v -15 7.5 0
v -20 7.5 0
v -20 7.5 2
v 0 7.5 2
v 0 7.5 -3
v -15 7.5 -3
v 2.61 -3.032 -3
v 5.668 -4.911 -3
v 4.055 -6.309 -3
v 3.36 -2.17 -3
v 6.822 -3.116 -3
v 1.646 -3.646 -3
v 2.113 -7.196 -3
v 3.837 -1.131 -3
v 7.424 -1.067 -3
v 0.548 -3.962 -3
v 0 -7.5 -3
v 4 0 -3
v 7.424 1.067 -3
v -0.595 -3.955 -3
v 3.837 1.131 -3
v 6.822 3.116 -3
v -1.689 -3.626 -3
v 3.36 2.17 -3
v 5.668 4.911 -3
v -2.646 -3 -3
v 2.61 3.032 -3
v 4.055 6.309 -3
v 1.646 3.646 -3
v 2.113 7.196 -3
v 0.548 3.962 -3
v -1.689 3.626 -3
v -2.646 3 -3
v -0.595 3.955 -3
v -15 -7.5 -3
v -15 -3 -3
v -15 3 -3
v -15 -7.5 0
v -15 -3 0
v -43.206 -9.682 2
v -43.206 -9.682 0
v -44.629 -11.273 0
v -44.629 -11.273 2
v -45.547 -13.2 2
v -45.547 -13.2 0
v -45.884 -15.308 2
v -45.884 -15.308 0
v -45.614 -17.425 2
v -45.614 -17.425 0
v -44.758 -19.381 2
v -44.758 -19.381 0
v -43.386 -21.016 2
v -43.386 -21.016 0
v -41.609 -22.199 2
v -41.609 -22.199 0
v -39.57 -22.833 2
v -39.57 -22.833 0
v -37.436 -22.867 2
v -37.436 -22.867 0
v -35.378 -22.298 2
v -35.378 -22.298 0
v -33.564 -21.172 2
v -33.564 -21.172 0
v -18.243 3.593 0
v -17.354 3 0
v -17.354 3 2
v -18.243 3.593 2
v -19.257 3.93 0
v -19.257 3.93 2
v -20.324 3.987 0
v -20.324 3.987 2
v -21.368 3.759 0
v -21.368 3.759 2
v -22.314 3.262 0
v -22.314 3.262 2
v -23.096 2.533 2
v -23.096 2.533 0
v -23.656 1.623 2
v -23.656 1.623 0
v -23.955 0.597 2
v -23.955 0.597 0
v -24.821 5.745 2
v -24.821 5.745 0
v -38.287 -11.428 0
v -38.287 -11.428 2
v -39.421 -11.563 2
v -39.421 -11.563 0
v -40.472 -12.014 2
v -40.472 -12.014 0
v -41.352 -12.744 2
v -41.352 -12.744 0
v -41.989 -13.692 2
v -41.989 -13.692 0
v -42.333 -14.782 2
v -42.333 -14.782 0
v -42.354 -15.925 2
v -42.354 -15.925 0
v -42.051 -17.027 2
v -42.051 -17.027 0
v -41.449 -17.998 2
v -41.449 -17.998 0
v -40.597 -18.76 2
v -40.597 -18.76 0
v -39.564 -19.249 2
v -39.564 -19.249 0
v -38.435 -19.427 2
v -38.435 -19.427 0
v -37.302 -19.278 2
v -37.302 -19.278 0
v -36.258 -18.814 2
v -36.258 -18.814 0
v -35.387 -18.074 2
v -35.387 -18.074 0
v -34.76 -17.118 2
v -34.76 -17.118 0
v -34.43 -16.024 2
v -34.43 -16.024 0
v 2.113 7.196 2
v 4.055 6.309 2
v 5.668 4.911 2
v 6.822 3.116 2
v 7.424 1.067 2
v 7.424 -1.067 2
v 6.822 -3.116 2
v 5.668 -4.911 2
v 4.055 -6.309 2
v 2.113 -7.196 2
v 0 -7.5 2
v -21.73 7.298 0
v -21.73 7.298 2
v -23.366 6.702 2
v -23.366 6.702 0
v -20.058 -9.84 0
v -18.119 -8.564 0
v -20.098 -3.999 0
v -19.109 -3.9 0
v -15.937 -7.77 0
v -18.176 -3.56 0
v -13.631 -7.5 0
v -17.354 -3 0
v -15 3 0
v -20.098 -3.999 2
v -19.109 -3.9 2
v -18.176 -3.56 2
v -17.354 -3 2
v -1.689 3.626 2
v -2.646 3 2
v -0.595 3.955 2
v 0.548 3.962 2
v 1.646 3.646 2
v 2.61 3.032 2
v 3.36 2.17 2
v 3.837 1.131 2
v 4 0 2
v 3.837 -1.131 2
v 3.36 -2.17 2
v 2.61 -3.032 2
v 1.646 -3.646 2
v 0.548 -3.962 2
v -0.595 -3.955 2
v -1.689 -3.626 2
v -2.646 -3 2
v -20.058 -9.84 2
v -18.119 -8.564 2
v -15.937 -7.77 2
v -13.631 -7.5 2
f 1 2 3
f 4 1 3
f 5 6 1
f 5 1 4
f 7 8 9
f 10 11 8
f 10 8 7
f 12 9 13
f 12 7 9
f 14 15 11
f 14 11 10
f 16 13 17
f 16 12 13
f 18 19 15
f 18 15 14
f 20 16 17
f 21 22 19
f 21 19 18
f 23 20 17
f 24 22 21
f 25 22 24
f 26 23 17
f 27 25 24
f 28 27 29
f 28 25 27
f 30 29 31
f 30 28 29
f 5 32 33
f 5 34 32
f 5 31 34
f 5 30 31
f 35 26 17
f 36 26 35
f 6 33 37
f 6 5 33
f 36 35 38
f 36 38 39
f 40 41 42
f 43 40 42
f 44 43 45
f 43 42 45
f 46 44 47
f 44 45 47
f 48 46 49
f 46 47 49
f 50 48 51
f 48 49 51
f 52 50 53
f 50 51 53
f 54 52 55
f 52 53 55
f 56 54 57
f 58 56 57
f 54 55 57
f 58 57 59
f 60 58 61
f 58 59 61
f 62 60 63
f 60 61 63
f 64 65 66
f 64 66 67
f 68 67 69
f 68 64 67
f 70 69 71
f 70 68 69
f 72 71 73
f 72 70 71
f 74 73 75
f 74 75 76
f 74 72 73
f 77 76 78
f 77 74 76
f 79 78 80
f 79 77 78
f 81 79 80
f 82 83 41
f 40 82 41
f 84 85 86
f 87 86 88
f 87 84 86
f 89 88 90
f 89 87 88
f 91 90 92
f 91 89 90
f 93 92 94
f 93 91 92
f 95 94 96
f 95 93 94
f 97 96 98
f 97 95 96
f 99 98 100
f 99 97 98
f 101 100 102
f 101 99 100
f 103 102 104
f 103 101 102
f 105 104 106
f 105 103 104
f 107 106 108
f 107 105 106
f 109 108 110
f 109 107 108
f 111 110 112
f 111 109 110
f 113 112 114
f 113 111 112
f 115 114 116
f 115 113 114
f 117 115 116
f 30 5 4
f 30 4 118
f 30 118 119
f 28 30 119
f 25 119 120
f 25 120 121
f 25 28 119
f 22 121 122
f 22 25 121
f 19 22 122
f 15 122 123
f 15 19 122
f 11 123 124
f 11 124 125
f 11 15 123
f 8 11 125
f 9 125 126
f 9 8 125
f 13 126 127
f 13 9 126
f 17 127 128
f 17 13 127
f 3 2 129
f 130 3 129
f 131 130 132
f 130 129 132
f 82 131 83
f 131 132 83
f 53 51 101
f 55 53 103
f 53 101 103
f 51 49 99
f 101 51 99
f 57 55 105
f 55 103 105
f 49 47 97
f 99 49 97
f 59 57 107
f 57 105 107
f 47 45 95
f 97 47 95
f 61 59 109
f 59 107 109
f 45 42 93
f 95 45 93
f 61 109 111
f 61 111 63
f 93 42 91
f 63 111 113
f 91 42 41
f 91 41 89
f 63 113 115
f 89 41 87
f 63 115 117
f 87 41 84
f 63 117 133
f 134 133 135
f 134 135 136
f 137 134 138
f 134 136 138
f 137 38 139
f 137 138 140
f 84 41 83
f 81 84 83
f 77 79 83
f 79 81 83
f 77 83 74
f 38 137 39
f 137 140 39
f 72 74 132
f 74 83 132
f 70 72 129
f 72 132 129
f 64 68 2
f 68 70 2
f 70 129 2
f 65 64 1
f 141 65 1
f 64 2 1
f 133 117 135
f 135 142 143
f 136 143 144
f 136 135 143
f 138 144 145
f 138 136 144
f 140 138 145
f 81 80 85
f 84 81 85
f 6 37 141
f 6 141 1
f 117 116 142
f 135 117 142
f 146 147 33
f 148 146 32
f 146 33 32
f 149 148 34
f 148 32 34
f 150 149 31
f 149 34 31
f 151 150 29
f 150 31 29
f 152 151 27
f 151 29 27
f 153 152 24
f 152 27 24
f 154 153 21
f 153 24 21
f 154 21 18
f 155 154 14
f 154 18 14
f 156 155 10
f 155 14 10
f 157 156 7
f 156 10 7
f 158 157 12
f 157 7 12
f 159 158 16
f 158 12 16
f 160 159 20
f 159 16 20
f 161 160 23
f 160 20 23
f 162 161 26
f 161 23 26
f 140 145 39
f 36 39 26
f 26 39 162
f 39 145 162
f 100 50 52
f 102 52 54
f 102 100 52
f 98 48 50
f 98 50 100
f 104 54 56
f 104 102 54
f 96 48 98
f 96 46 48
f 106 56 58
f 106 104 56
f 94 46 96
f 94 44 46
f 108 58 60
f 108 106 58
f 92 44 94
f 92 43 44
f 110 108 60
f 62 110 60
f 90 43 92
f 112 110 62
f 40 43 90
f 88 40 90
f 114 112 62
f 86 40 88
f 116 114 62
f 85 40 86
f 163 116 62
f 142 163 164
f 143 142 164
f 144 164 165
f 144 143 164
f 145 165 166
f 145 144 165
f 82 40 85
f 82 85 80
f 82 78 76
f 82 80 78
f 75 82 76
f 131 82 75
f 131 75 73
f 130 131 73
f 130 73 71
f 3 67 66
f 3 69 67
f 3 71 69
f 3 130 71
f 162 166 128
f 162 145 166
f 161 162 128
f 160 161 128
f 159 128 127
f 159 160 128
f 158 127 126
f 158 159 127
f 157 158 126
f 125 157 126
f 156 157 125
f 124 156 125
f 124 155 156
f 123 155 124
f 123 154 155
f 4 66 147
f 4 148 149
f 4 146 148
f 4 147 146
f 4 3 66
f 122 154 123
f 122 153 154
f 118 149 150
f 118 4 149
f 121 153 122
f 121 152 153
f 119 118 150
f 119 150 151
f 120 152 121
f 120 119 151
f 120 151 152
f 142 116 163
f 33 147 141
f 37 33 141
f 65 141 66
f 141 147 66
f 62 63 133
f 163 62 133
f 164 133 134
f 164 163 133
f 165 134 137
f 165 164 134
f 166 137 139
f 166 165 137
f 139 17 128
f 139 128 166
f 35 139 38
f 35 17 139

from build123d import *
from build123d.topology import SkipClean

# Parameters (mm, degrees)
SKETCH_1_R          = 7.5
SKETCH_1_R_2        = 4
EXTRUDE_1_DEPTH     = 2
FILLET_1_R          = 10
EXTRUDE_START       = 3
SKETCH_2_R          = 4
EXTRUDE_2_DEPTH     = 3
CUT_EXTRUDE_1_DEPTH = 52.537192438


with BuildPart() as part:
    # Эскиз1 → Бобышка-Вытянуть1 (new body)
    # profile 1 of 6: a face of its own
    with BuildSketch(Plane.XY):
        with Locations((-38.385066635, -15.426902632)):
            Circle(SKETCH_1_R)
        with Locations((-38.385066635, -15.426902632)):
            Circle(SKETCH_1_R_2, mode=Mode.SUBTRACT)
    # profile 2 of 6: a face of its own
    with BuildSketch(Plane.XY):
        with BuildLine():
            ThreePointArc((-20, -7.5), (-27.047694656, -2.565151075), (-24.820907073, 5.745333323))
            Line((-24.820907073, 5.745333323), (-43.205973708, -9.681569309))
            ThreePointArc((-43.205973708, -9.681569309), (-35.215429672, -8.62959423), (-30.885066635, -15.426902632))
            ThreePointArc((-30.885066635, -15.426902632), (-31.587758232, -18.596539596), (-33.564159562, -21.172235956))
            Line((-33.564159562, -21.172235956), (-17.270223243, -7.5))
            Line((-17.270223243, -7.5), (-20, -7.5))
        make_face()
    # profile 3 of 6: a face of its own
    with BuildSketch(Plane.XY):
        with Locations((-20, 0)):
            Circle(SKETCH_1_R)
        with Locations((-20, 0)):
            Circle(SKETCH_1_R_2, mode=Mode.SUBTRACT)
    # profile 4 of 6: a face of its own
    with BuildSketch(Plane.XY):
        with BuildLine():
            Line((-20, -7.5), (-17.270223243, -7.5))
            Line((-17.270223243, -7.5), (-15.179092927, -5.745333323))
            ThreePointArc((-15.179092927, -5.745333323), (-17.434848925, -7.047694656), (-20, -7.5))
        make_face()
    # profile 5 of 6: a face of its own
    with BuildSketch(Plane.XY):
        with BuildLine():
            ThreePointArc((0, -7.5), (-7.5, 0), (0, 7.5))
            Line((0, 7.5), (-20, 7.5))
            ThreePointArc((-20, 7.5), (-14.696699141, 5.303300859), (-12.5, 0))
            ThreePointArc((-12.5, 0), (-13.202691597, -3.169636963), (-15.179092927, -5.745333323))
            Line((-15.179092927, -5.745333323), (-17.270223243, -7.5))
            Line((-17.270223243, -7.5), (0, -7.5))
        make_face()
    # profile 6 of 6: a face of its own
    with BuildSketch(Plane.XY):
        Circle(SKETCH_1_R)
        Circle(SKETCH_1_R_2, mode=Mode.SUBTRACT)
    extrude(amount=EXTRUDE_1_DEPTH)

    # Скругление1
    fillet_1_edges = [part.edges().sort_by_distance(p)[0] for p in [
        (-17.270223243, -7.5, 1),
    ]]
    fillet(fillet_1_edges, radius=FILLET_1_R)

    # Эскиз2 → Бобышка-Вытянуть2 (add)
    with SkipClean():  # the faces are left unmerged after this step: merging them gives an invalid solid
        with BuildSketch(Plane(origin=(0, 0, 0), x_dir=(-1, 0, 0), z_dir=(0, 0, -1)).offset(EXTRUDE_START)):
            with BuildLine():
                Line((0, -7.5), (15, -7.5))
                Line((15, -7.5), (15, 7.5))
                Line((15, 7.5), (0, 7.5))
                ThreePointArc((0, 7.5), (-7.5, 0), (0, -7.5))
            make_face()
            Circle(SKETCH_2_R, mode=Mode.SUBTRACT)
        extrude(amount=-EXTRUDE_2_DEPTH)

    # Эскиз4 → Вырез-Вытянуть1 (cut, through all)
    with BuildSketch(Plane.XY.offset(2)):
        with BuildLine():
            Line((-23.955125919, 0.597477168), (-38.286666374, -11.428113142))
            ThreePointArc((-38.286666374, -11.428113142), (-35.52206113, -12.633481884), (-34.385066635, -15.426902632))
            ThreePointArc((-34.385066635, -15.426902632), (-34.396300931, -15.726482609), (-34.429940716, -16.024379801))
            Line((-34.429940716, -16.024379801), (-20.098400261, -3.99878949))
            ThreePointArc((-20.098400261, -3.99878949), (-23.064177772, -2.571150439), (-23.955125919, 0.597477168))
        make_face()
        with BuildLine():
            Line((-2.645751311, 3), (-17.354248689, 3))
            ThreePointArc((-17.354248689, 3), (-16.354248689, 1.645751311), (-16, 0))
            ThreePointArc((-16, 0), (-16.354248689, -1.645751311), (-17.354248689, -3))
            Line((-17.354248689, -3), (-2.645751311, -3))
            ThreePointArc((-2.645751311, -3), (-4, 0), (-2.645751311, 3))
        make_face()
    extrude(amount=-CUT_EXTRUDE_1_DEPTH, mode=Mode.SUBTRACT)


solid = part.part
